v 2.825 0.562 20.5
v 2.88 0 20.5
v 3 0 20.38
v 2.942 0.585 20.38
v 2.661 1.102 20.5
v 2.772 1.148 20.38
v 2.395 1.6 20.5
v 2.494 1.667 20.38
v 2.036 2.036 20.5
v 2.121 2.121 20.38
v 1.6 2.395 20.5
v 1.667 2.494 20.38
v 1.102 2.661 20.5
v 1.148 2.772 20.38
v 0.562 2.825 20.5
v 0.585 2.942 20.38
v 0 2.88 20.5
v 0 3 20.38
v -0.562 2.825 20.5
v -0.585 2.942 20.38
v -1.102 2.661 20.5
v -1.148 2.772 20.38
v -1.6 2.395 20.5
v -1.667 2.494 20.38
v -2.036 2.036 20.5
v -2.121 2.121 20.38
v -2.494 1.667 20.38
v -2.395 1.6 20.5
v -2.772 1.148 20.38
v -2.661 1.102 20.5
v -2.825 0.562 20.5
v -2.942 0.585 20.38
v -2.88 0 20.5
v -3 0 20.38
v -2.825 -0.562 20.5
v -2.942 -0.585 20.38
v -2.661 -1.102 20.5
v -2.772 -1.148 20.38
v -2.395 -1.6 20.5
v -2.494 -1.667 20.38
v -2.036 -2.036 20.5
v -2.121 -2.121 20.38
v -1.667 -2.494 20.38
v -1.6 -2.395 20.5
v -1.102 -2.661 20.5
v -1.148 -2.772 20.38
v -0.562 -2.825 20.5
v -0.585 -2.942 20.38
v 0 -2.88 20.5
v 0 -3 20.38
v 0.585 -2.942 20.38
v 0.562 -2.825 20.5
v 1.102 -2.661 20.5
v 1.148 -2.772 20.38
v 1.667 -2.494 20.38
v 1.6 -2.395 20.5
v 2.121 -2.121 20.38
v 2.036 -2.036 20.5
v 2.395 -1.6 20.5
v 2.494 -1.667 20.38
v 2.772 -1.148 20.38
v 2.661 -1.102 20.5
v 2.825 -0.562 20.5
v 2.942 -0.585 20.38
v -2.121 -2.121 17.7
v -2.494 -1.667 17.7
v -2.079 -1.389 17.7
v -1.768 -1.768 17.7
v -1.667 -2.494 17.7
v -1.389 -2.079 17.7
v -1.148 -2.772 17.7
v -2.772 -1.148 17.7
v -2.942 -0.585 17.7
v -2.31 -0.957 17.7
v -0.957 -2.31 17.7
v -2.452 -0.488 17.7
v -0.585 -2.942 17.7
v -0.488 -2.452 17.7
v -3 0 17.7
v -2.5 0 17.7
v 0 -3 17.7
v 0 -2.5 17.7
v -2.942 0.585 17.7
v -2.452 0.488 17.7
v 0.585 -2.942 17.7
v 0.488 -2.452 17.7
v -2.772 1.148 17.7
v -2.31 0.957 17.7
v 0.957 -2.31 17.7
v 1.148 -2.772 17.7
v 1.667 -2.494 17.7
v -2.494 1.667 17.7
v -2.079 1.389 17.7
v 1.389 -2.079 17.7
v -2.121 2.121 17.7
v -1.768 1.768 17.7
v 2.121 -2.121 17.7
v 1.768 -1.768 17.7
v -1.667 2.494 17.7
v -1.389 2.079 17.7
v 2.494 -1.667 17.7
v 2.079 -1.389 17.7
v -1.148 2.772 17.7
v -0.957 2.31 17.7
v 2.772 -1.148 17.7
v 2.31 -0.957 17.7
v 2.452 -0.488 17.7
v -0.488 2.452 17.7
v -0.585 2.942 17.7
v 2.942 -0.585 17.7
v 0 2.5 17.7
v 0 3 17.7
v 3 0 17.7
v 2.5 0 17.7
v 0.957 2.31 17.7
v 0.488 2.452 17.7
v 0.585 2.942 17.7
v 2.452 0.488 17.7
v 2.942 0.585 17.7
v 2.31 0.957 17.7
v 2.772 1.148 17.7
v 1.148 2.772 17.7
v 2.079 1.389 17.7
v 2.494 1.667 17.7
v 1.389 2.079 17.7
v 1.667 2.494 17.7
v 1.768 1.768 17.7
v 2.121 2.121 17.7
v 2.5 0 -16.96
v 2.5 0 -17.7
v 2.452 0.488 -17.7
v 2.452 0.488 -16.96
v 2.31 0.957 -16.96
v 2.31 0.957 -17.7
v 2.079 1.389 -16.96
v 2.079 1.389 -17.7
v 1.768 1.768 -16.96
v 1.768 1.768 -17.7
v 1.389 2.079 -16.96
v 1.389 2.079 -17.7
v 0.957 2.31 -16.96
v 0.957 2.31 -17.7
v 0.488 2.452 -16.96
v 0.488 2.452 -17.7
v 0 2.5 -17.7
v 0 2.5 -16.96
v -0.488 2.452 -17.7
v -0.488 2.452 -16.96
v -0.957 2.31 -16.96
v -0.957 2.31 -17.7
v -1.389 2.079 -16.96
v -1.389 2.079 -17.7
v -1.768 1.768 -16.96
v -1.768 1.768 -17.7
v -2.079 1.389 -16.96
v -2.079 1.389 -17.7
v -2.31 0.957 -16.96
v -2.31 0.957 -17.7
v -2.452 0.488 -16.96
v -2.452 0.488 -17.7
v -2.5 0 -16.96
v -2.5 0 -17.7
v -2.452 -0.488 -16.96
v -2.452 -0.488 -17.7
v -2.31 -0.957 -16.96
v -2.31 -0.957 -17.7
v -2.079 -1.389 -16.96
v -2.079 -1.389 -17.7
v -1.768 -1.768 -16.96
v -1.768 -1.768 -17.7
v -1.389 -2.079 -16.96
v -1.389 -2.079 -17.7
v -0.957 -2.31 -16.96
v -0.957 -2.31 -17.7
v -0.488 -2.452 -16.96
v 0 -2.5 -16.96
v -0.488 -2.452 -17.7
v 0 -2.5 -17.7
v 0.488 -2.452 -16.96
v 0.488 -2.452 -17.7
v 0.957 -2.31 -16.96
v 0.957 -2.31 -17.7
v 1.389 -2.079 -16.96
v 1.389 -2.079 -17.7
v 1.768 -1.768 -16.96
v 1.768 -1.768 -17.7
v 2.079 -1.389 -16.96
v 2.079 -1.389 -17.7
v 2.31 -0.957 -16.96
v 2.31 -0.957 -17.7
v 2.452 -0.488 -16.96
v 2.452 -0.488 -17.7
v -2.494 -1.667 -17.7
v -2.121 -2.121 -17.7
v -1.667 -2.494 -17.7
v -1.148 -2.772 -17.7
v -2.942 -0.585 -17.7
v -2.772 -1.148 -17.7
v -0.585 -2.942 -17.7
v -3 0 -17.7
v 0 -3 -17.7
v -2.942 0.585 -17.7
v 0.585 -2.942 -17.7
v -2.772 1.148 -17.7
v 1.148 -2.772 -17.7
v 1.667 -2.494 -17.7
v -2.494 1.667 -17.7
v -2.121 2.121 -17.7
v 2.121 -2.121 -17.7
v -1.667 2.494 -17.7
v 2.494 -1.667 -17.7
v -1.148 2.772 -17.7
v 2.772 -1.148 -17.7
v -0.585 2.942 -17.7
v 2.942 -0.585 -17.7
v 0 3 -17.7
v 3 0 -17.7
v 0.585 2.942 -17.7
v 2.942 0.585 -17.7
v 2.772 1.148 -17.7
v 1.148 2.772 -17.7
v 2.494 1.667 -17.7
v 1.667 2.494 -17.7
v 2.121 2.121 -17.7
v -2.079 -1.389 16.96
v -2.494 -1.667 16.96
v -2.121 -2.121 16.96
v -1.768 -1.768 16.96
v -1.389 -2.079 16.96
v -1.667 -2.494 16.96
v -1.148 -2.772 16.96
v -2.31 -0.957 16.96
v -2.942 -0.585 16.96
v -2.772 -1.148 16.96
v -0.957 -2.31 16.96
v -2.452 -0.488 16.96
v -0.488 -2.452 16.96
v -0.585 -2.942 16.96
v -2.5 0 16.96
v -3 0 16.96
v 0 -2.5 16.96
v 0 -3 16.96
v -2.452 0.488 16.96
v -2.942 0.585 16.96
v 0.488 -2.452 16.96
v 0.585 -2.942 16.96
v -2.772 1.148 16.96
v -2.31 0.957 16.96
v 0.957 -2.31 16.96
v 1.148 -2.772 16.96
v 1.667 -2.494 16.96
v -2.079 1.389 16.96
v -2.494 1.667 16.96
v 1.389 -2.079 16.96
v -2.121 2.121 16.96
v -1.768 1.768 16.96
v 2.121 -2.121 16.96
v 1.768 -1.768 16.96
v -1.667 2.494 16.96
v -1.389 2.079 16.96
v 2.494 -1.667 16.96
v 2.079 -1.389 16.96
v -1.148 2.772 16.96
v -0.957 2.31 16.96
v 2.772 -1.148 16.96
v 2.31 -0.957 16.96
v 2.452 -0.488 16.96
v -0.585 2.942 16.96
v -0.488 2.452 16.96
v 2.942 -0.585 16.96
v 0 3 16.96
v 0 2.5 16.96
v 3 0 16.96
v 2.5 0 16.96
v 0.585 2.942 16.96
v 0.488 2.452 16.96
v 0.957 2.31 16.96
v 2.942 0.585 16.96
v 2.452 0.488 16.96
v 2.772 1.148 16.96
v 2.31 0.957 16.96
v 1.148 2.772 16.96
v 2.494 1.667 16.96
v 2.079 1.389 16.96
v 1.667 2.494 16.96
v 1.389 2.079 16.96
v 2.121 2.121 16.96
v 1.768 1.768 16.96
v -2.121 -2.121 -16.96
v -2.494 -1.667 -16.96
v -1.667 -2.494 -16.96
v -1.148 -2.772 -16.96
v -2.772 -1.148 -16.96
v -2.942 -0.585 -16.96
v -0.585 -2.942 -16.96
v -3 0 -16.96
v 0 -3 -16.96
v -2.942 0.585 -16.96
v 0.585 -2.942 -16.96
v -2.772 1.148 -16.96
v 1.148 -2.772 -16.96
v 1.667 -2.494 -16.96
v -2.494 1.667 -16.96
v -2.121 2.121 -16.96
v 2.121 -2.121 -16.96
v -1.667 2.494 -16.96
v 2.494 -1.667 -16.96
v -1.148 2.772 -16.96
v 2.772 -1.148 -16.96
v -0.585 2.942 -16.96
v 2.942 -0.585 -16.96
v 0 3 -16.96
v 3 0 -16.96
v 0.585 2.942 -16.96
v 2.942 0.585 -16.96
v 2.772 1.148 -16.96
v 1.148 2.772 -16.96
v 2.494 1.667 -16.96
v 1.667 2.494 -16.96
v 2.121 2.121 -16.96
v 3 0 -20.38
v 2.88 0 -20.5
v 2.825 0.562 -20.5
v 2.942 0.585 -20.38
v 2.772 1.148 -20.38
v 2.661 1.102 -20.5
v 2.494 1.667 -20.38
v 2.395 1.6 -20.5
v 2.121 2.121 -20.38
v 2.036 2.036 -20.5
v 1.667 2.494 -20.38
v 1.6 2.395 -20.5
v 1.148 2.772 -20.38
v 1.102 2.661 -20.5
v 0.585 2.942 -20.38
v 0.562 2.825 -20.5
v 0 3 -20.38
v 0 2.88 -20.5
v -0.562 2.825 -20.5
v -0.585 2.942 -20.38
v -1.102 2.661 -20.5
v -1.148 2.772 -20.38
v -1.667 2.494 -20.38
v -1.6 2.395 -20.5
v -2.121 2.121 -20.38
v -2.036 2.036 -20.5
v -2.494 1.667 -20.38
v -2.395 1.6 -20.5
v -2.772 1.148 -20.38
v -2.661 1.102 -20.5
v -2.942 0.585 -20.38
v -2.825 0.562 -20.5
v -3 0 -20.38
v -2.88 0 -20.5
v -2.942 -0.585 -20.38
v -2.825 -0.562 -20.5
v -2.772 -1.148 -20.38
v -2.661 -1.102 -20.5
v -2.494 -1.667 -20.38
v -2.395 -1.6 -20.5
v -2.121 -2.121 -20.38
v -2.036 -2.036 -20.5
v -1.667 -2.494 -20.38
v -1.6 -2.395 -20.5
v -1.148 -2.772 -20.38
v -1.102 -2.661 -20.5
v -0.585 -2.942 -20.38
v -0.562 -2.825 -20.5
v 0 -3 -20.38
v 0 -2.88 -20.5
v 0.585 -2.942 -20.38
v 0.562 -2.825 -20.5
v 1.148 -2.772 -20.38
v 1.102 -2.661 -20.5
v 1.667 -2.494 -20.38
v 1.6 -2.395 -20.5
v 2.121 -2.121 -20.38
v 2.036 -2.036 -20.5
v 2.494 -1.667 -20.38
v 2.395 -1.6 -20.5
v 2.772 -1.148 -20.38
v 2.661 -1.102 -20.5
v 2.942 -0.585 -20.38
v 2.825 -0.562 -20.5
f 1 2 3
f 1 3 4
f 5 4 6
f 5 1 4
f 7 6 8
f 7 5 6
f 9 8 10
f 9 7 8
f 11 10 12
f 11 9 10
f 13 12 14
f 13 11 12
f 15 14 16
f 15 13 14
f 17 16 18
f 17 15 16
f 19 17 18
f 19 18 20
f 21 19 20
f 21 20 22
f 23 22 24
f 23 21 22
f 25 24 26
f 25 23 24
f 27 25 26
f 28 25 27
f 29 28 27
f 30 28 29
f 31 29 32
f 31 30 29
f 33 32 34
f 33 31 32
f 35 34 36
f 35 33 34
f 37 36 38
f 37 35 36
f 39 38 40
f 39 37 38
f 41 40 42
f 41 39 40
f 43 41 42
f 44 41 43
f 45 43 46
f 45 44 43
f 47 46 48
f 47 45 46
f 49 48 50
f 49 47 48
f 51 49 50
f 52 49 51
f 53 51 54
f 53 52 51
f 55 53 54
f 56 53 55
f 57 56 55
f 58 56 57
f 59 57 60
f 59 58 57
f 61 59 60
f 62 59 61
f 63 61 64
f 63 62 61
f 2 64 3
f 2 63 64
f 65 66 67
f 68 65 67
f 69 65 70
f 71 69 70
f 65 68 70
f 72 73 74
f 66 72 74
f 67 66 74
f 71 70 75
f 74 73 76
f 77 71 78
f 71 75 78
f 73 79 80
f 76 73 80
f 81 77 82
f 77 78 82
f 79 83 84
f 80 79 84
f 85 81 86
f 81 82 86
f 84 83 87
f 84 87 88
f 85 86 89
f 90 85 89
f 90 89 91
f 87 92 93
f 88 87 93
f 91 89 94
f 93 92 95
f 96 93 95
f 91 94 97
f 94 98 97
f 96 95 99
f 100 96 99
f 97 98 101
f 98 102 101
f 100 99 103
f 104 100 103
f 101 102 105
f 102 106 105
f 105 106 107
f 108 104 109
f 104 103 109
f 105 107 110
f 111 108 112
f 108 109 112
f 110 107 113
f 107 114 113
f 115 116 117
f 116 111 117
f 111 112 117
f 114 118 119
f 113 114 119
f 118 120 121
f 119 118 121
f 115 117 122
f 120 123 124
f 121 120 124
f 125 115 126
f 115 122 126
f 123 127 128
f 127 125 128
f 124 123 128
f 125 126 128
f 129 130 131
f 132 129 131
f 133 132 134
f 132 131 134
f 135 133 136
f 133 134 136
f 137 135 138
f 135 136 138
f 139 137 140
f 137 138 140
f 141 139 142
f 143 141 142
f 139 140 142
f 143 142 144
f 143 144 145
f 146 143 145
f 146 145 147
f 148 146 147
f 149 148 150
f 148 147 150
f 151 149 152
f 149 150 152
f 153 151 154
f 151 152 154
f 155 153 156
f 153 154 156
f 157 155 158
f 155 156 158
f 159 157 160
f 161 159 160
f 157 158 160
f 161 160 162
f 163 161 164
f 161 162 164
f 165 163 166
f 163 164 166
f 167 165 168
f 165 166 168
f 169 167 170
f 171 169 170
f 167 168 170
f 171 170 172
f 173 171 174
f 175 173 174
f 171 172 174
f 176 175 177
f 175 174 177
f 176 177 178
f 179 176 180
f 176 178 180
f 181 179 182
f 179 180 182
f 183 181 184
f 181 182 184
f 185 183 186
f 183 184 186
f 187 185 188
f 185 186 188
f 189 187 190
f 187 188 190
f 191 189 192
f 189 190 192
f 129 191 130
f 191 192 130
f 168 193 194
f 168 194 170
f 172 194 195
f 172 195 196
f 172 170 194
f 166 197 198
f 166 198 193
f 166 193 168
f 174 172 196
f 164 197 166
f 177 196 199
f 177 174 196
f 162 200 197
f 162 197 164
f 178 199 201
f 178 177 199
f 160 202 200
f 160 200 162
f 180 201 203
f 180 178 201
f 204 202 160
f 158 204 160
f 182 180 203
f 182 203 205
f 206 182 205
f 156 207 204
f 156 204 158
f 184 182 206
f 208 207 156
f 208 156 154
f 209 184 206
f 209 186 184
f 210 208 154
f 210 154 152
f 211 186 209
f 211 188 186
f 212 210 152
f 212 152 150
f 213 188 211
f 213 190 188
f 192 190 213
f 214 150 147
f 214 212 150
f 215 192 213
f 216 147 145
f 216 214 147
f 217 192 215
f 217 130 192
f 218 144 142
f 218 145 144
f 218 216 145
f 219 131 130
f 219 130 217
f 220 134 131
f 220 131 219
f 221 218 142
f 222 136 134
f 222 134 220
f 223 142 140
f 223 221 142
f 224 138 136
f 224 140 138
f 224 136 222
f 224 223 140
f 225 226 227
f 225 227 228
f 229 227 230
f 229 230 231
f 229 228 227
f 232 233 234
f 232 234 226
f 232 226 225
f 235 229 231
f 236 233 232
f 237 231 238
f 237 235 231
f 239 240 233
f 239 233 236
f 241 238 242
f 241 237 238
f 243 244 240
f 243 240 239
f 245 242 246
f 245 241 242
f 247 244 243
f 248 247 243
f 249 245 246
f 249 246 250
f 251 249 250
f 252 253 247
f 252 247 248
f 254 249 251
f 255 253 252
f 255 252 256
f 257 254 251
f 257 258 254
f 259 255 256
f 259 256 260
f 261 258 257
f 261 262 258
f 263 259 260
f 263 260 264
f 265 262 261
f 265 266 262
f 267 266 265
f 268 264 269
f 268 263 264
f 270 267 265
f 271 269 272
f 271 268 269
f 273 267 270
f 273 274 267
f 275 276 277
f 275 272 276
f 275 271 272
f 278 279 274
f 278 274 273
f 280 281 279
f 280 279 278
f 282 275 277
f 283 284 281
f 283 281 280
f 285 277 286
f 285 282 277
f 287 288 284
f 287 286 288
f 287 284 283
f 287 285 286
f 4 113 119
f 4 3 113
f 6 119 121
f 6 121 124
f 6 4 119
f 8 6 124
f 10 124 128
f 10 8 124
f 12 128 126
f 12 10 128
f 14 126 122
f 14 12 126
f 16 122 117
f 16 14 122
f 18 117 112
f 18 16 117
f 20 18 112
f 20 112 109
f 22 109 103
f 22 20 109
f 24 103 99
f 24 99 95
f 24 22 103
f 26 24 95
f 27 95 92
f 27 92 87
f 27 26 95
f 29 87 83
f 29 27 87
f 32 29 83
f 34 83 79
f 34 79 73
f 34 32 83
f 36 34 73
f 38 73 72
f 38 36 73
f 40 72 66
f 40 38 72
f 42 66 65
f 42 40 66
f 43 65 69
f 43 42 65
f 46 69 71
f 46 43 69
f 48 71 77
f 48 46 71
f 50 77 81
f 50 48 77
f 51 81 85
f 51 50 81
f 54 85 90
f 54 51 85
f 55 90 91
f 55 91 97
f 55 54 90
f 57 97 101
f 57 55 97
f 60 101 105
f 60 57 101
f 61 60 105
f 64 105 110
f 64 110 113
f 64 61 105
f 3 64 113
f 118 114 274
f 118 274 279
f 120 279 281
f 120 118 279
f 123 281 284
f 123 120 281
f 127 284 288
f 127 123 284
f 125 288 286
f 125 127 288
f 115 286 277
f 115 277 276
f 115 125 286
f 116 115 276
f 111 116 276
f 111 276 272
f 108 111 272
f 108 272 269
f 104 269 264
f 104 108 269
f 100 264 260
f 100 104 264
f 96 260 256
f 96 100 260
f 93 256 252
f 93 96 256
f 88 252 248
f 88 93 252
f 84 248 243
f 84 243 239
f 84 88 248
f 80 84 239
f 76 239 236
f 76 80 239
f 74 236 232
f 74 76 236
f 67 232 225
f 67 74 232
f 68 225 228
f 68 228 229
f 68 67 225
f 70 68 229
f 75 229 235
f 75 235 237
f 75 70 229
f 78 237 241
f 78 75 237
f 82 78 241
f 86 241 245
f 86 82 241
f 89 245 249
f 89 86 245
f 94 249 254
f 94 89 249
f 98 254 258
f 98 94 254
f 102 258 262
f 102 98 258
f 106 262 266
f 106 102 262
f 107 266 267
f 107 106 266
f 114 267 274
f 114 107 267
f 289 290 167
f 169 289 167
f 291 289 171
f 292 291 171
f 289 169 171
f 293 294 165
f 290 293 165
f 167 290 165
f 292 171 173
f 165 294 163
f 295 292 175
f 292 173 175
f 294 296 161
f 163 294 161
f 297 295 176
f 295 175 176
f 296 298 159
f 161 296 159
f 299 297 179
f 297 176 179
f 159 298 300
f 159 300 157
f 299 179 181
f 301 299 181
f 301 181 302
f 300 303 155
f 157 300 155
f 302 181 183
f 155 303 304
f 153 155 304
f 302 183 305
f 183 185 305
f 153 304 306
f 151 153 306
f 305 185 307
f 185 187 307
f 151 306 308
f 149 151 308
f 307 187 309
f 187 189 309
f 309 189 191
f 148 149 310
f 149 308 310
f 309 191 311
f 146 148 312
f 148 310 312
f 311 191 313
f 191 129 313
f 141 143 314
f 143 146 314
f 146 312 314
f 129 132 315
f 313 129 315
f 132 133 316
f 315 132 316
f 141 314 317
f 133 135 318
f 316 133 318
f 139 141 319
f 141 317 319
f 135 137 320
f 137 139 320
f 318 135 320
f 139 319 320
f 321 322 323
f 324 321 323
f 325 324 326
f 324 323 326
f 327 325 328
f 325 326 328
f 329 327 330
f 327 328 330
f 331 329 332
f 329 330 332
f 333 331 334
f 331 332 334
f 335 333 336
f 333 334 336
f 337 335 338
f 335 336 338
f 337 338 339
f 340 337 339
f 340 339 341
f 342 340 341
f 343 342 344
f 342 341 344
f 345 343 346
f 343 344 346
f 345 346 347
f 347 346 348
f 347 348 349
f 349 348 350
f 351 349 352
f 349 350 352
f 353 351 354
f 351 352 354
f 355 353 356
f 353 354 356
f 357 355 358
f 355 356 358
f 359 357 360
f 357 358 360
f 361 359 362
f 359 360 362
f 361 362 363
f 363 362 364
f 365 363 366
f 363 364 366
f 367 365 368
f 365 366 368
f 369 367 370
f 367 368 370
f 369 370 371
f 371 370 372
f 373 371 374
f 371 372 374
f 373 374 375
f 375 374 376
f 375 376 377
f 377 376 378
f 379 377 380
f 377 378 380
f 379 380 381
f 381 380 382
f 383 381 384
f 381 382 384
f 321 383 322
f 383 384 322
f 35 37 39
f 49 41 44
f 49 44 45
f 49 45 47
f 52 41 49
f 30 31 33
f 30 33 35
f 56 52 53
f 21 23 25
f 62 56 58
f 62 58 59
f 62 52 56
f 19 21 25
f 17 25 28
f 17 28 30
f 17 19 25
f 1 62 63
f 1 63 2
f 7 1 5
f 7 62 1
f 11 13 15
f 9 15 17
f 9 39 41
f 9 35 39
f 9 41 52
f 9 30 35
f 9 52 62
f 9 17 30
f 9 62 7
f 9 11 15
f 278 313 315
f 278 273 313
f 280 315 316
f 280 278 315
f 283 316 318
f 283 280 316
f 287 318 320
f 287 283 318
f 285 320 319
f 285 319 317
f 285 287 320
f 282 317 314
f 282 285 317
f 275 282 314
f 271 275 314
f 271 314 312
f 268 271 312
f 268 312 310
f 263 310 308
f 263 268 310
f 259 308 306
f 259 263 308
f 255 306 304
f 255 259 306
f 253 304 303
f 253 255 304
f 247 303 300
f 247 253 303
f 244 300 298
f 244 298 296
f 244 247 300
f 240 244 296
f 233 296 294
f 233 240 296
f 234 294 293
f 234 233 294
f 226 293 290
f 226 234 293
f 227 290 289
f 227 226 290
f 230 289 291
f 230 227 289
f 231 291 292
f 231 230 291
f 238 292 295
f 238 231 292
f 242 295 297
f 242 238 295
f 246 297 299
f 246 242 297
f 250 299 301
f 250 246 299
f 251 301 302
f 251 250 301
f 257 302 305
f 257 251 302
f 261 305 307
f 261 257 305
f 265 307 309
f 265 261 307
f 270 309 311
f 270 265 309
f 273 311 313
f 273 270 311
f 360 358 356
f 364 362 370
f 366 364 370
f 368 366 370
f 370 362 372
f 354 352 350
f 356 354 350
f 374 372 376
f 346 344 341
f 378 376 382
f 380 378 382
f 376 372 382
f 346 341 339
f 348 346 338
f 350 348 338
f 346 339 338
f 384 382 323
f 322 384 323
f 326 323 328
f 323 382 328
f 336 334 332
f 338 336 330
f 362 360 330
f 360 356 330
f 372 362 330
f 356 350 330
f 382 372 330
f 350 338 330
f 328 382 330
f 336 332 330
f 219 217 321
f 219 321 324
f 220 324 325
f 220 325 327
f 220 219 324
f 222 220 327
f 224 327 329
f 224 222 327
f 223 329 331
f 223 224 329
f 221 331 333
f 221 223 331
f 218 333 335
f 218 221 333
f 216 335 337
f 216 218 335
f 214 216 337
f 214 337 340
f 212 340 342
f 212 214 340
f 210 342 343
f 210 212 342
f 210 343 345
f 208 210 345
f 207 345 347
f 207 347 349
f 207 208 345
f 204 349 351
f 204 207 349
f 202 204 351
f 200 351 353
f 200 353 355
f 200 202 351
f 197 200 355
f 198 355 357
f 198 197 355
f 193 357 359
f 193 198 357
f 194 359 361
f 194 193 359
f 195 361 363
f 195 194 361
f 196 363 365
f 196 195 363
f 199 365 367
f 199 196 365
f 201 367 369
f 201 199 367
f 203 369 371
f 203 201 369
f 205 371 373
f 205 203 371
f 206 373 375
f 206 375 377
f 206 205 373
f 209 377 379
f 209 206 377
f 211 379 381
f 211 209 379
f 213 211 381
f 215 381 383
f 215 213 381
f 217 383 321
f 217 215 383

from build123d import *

# Parameters (mm, degrees)
SKETCH2_R                = 3
BOSS_EXTRUDE1_DEPTH      = 20.5
BOSS_EXTRUDE1_DEPTH_BACK = 20.5
CHAMFER1_SIZE            = 0.12
CUT_EXTRUDE1_START       = -2.1
SKETCH3_R                = 3
SKETCH3_R_2              = 2.5
CUT_EXTRUDE1_DEPTH       = 0.74


with BuildPart() as part:
    # Sketch2 → Boss-Extrude1 (new body, two sides)
    with BuildSketch(Plane.XY) as boss_extrude1_sk:
        Circle(SKETCH2_R)
    extrude(amount=BOSS_EXTRUDE1_DEPTH)
    extrude(boss_extrude1_sk.sketch, amount=-BOSS_EXTRUDE1_DEPTH_BACK)

    # Chamfer1
    chamfer1_edges = [part.edges().sort_by_distance(p)[0] for p in [
        (-3, 0, -20.5),
        (-3, 0, 20.5),
    ]]
    chamfer(chamfer1_edges, length=CHAMFER1_SIZE)

    # Sketch3 → Cut-Extrude1 (cut)
    with BuildSketch(Plane.XY.offset(19.8).offset(CUT_EXTRUDE1_START)):
        Circle(SKETCH3_R)
        Circle(SKETCH3_R_2, mode=Mode.SUBTRACT)
    cut_extrude1 = extrude(amount=-CUT_EXTRUDE1_DEPTH, mode=Mode.SUBTRACT)

    # Mirror1: Cut-Extrude1 across plane
    add(cut_extrude1.mirror(Plane.XY), mode=Mode.SUBTRACT)


solid = part.part
